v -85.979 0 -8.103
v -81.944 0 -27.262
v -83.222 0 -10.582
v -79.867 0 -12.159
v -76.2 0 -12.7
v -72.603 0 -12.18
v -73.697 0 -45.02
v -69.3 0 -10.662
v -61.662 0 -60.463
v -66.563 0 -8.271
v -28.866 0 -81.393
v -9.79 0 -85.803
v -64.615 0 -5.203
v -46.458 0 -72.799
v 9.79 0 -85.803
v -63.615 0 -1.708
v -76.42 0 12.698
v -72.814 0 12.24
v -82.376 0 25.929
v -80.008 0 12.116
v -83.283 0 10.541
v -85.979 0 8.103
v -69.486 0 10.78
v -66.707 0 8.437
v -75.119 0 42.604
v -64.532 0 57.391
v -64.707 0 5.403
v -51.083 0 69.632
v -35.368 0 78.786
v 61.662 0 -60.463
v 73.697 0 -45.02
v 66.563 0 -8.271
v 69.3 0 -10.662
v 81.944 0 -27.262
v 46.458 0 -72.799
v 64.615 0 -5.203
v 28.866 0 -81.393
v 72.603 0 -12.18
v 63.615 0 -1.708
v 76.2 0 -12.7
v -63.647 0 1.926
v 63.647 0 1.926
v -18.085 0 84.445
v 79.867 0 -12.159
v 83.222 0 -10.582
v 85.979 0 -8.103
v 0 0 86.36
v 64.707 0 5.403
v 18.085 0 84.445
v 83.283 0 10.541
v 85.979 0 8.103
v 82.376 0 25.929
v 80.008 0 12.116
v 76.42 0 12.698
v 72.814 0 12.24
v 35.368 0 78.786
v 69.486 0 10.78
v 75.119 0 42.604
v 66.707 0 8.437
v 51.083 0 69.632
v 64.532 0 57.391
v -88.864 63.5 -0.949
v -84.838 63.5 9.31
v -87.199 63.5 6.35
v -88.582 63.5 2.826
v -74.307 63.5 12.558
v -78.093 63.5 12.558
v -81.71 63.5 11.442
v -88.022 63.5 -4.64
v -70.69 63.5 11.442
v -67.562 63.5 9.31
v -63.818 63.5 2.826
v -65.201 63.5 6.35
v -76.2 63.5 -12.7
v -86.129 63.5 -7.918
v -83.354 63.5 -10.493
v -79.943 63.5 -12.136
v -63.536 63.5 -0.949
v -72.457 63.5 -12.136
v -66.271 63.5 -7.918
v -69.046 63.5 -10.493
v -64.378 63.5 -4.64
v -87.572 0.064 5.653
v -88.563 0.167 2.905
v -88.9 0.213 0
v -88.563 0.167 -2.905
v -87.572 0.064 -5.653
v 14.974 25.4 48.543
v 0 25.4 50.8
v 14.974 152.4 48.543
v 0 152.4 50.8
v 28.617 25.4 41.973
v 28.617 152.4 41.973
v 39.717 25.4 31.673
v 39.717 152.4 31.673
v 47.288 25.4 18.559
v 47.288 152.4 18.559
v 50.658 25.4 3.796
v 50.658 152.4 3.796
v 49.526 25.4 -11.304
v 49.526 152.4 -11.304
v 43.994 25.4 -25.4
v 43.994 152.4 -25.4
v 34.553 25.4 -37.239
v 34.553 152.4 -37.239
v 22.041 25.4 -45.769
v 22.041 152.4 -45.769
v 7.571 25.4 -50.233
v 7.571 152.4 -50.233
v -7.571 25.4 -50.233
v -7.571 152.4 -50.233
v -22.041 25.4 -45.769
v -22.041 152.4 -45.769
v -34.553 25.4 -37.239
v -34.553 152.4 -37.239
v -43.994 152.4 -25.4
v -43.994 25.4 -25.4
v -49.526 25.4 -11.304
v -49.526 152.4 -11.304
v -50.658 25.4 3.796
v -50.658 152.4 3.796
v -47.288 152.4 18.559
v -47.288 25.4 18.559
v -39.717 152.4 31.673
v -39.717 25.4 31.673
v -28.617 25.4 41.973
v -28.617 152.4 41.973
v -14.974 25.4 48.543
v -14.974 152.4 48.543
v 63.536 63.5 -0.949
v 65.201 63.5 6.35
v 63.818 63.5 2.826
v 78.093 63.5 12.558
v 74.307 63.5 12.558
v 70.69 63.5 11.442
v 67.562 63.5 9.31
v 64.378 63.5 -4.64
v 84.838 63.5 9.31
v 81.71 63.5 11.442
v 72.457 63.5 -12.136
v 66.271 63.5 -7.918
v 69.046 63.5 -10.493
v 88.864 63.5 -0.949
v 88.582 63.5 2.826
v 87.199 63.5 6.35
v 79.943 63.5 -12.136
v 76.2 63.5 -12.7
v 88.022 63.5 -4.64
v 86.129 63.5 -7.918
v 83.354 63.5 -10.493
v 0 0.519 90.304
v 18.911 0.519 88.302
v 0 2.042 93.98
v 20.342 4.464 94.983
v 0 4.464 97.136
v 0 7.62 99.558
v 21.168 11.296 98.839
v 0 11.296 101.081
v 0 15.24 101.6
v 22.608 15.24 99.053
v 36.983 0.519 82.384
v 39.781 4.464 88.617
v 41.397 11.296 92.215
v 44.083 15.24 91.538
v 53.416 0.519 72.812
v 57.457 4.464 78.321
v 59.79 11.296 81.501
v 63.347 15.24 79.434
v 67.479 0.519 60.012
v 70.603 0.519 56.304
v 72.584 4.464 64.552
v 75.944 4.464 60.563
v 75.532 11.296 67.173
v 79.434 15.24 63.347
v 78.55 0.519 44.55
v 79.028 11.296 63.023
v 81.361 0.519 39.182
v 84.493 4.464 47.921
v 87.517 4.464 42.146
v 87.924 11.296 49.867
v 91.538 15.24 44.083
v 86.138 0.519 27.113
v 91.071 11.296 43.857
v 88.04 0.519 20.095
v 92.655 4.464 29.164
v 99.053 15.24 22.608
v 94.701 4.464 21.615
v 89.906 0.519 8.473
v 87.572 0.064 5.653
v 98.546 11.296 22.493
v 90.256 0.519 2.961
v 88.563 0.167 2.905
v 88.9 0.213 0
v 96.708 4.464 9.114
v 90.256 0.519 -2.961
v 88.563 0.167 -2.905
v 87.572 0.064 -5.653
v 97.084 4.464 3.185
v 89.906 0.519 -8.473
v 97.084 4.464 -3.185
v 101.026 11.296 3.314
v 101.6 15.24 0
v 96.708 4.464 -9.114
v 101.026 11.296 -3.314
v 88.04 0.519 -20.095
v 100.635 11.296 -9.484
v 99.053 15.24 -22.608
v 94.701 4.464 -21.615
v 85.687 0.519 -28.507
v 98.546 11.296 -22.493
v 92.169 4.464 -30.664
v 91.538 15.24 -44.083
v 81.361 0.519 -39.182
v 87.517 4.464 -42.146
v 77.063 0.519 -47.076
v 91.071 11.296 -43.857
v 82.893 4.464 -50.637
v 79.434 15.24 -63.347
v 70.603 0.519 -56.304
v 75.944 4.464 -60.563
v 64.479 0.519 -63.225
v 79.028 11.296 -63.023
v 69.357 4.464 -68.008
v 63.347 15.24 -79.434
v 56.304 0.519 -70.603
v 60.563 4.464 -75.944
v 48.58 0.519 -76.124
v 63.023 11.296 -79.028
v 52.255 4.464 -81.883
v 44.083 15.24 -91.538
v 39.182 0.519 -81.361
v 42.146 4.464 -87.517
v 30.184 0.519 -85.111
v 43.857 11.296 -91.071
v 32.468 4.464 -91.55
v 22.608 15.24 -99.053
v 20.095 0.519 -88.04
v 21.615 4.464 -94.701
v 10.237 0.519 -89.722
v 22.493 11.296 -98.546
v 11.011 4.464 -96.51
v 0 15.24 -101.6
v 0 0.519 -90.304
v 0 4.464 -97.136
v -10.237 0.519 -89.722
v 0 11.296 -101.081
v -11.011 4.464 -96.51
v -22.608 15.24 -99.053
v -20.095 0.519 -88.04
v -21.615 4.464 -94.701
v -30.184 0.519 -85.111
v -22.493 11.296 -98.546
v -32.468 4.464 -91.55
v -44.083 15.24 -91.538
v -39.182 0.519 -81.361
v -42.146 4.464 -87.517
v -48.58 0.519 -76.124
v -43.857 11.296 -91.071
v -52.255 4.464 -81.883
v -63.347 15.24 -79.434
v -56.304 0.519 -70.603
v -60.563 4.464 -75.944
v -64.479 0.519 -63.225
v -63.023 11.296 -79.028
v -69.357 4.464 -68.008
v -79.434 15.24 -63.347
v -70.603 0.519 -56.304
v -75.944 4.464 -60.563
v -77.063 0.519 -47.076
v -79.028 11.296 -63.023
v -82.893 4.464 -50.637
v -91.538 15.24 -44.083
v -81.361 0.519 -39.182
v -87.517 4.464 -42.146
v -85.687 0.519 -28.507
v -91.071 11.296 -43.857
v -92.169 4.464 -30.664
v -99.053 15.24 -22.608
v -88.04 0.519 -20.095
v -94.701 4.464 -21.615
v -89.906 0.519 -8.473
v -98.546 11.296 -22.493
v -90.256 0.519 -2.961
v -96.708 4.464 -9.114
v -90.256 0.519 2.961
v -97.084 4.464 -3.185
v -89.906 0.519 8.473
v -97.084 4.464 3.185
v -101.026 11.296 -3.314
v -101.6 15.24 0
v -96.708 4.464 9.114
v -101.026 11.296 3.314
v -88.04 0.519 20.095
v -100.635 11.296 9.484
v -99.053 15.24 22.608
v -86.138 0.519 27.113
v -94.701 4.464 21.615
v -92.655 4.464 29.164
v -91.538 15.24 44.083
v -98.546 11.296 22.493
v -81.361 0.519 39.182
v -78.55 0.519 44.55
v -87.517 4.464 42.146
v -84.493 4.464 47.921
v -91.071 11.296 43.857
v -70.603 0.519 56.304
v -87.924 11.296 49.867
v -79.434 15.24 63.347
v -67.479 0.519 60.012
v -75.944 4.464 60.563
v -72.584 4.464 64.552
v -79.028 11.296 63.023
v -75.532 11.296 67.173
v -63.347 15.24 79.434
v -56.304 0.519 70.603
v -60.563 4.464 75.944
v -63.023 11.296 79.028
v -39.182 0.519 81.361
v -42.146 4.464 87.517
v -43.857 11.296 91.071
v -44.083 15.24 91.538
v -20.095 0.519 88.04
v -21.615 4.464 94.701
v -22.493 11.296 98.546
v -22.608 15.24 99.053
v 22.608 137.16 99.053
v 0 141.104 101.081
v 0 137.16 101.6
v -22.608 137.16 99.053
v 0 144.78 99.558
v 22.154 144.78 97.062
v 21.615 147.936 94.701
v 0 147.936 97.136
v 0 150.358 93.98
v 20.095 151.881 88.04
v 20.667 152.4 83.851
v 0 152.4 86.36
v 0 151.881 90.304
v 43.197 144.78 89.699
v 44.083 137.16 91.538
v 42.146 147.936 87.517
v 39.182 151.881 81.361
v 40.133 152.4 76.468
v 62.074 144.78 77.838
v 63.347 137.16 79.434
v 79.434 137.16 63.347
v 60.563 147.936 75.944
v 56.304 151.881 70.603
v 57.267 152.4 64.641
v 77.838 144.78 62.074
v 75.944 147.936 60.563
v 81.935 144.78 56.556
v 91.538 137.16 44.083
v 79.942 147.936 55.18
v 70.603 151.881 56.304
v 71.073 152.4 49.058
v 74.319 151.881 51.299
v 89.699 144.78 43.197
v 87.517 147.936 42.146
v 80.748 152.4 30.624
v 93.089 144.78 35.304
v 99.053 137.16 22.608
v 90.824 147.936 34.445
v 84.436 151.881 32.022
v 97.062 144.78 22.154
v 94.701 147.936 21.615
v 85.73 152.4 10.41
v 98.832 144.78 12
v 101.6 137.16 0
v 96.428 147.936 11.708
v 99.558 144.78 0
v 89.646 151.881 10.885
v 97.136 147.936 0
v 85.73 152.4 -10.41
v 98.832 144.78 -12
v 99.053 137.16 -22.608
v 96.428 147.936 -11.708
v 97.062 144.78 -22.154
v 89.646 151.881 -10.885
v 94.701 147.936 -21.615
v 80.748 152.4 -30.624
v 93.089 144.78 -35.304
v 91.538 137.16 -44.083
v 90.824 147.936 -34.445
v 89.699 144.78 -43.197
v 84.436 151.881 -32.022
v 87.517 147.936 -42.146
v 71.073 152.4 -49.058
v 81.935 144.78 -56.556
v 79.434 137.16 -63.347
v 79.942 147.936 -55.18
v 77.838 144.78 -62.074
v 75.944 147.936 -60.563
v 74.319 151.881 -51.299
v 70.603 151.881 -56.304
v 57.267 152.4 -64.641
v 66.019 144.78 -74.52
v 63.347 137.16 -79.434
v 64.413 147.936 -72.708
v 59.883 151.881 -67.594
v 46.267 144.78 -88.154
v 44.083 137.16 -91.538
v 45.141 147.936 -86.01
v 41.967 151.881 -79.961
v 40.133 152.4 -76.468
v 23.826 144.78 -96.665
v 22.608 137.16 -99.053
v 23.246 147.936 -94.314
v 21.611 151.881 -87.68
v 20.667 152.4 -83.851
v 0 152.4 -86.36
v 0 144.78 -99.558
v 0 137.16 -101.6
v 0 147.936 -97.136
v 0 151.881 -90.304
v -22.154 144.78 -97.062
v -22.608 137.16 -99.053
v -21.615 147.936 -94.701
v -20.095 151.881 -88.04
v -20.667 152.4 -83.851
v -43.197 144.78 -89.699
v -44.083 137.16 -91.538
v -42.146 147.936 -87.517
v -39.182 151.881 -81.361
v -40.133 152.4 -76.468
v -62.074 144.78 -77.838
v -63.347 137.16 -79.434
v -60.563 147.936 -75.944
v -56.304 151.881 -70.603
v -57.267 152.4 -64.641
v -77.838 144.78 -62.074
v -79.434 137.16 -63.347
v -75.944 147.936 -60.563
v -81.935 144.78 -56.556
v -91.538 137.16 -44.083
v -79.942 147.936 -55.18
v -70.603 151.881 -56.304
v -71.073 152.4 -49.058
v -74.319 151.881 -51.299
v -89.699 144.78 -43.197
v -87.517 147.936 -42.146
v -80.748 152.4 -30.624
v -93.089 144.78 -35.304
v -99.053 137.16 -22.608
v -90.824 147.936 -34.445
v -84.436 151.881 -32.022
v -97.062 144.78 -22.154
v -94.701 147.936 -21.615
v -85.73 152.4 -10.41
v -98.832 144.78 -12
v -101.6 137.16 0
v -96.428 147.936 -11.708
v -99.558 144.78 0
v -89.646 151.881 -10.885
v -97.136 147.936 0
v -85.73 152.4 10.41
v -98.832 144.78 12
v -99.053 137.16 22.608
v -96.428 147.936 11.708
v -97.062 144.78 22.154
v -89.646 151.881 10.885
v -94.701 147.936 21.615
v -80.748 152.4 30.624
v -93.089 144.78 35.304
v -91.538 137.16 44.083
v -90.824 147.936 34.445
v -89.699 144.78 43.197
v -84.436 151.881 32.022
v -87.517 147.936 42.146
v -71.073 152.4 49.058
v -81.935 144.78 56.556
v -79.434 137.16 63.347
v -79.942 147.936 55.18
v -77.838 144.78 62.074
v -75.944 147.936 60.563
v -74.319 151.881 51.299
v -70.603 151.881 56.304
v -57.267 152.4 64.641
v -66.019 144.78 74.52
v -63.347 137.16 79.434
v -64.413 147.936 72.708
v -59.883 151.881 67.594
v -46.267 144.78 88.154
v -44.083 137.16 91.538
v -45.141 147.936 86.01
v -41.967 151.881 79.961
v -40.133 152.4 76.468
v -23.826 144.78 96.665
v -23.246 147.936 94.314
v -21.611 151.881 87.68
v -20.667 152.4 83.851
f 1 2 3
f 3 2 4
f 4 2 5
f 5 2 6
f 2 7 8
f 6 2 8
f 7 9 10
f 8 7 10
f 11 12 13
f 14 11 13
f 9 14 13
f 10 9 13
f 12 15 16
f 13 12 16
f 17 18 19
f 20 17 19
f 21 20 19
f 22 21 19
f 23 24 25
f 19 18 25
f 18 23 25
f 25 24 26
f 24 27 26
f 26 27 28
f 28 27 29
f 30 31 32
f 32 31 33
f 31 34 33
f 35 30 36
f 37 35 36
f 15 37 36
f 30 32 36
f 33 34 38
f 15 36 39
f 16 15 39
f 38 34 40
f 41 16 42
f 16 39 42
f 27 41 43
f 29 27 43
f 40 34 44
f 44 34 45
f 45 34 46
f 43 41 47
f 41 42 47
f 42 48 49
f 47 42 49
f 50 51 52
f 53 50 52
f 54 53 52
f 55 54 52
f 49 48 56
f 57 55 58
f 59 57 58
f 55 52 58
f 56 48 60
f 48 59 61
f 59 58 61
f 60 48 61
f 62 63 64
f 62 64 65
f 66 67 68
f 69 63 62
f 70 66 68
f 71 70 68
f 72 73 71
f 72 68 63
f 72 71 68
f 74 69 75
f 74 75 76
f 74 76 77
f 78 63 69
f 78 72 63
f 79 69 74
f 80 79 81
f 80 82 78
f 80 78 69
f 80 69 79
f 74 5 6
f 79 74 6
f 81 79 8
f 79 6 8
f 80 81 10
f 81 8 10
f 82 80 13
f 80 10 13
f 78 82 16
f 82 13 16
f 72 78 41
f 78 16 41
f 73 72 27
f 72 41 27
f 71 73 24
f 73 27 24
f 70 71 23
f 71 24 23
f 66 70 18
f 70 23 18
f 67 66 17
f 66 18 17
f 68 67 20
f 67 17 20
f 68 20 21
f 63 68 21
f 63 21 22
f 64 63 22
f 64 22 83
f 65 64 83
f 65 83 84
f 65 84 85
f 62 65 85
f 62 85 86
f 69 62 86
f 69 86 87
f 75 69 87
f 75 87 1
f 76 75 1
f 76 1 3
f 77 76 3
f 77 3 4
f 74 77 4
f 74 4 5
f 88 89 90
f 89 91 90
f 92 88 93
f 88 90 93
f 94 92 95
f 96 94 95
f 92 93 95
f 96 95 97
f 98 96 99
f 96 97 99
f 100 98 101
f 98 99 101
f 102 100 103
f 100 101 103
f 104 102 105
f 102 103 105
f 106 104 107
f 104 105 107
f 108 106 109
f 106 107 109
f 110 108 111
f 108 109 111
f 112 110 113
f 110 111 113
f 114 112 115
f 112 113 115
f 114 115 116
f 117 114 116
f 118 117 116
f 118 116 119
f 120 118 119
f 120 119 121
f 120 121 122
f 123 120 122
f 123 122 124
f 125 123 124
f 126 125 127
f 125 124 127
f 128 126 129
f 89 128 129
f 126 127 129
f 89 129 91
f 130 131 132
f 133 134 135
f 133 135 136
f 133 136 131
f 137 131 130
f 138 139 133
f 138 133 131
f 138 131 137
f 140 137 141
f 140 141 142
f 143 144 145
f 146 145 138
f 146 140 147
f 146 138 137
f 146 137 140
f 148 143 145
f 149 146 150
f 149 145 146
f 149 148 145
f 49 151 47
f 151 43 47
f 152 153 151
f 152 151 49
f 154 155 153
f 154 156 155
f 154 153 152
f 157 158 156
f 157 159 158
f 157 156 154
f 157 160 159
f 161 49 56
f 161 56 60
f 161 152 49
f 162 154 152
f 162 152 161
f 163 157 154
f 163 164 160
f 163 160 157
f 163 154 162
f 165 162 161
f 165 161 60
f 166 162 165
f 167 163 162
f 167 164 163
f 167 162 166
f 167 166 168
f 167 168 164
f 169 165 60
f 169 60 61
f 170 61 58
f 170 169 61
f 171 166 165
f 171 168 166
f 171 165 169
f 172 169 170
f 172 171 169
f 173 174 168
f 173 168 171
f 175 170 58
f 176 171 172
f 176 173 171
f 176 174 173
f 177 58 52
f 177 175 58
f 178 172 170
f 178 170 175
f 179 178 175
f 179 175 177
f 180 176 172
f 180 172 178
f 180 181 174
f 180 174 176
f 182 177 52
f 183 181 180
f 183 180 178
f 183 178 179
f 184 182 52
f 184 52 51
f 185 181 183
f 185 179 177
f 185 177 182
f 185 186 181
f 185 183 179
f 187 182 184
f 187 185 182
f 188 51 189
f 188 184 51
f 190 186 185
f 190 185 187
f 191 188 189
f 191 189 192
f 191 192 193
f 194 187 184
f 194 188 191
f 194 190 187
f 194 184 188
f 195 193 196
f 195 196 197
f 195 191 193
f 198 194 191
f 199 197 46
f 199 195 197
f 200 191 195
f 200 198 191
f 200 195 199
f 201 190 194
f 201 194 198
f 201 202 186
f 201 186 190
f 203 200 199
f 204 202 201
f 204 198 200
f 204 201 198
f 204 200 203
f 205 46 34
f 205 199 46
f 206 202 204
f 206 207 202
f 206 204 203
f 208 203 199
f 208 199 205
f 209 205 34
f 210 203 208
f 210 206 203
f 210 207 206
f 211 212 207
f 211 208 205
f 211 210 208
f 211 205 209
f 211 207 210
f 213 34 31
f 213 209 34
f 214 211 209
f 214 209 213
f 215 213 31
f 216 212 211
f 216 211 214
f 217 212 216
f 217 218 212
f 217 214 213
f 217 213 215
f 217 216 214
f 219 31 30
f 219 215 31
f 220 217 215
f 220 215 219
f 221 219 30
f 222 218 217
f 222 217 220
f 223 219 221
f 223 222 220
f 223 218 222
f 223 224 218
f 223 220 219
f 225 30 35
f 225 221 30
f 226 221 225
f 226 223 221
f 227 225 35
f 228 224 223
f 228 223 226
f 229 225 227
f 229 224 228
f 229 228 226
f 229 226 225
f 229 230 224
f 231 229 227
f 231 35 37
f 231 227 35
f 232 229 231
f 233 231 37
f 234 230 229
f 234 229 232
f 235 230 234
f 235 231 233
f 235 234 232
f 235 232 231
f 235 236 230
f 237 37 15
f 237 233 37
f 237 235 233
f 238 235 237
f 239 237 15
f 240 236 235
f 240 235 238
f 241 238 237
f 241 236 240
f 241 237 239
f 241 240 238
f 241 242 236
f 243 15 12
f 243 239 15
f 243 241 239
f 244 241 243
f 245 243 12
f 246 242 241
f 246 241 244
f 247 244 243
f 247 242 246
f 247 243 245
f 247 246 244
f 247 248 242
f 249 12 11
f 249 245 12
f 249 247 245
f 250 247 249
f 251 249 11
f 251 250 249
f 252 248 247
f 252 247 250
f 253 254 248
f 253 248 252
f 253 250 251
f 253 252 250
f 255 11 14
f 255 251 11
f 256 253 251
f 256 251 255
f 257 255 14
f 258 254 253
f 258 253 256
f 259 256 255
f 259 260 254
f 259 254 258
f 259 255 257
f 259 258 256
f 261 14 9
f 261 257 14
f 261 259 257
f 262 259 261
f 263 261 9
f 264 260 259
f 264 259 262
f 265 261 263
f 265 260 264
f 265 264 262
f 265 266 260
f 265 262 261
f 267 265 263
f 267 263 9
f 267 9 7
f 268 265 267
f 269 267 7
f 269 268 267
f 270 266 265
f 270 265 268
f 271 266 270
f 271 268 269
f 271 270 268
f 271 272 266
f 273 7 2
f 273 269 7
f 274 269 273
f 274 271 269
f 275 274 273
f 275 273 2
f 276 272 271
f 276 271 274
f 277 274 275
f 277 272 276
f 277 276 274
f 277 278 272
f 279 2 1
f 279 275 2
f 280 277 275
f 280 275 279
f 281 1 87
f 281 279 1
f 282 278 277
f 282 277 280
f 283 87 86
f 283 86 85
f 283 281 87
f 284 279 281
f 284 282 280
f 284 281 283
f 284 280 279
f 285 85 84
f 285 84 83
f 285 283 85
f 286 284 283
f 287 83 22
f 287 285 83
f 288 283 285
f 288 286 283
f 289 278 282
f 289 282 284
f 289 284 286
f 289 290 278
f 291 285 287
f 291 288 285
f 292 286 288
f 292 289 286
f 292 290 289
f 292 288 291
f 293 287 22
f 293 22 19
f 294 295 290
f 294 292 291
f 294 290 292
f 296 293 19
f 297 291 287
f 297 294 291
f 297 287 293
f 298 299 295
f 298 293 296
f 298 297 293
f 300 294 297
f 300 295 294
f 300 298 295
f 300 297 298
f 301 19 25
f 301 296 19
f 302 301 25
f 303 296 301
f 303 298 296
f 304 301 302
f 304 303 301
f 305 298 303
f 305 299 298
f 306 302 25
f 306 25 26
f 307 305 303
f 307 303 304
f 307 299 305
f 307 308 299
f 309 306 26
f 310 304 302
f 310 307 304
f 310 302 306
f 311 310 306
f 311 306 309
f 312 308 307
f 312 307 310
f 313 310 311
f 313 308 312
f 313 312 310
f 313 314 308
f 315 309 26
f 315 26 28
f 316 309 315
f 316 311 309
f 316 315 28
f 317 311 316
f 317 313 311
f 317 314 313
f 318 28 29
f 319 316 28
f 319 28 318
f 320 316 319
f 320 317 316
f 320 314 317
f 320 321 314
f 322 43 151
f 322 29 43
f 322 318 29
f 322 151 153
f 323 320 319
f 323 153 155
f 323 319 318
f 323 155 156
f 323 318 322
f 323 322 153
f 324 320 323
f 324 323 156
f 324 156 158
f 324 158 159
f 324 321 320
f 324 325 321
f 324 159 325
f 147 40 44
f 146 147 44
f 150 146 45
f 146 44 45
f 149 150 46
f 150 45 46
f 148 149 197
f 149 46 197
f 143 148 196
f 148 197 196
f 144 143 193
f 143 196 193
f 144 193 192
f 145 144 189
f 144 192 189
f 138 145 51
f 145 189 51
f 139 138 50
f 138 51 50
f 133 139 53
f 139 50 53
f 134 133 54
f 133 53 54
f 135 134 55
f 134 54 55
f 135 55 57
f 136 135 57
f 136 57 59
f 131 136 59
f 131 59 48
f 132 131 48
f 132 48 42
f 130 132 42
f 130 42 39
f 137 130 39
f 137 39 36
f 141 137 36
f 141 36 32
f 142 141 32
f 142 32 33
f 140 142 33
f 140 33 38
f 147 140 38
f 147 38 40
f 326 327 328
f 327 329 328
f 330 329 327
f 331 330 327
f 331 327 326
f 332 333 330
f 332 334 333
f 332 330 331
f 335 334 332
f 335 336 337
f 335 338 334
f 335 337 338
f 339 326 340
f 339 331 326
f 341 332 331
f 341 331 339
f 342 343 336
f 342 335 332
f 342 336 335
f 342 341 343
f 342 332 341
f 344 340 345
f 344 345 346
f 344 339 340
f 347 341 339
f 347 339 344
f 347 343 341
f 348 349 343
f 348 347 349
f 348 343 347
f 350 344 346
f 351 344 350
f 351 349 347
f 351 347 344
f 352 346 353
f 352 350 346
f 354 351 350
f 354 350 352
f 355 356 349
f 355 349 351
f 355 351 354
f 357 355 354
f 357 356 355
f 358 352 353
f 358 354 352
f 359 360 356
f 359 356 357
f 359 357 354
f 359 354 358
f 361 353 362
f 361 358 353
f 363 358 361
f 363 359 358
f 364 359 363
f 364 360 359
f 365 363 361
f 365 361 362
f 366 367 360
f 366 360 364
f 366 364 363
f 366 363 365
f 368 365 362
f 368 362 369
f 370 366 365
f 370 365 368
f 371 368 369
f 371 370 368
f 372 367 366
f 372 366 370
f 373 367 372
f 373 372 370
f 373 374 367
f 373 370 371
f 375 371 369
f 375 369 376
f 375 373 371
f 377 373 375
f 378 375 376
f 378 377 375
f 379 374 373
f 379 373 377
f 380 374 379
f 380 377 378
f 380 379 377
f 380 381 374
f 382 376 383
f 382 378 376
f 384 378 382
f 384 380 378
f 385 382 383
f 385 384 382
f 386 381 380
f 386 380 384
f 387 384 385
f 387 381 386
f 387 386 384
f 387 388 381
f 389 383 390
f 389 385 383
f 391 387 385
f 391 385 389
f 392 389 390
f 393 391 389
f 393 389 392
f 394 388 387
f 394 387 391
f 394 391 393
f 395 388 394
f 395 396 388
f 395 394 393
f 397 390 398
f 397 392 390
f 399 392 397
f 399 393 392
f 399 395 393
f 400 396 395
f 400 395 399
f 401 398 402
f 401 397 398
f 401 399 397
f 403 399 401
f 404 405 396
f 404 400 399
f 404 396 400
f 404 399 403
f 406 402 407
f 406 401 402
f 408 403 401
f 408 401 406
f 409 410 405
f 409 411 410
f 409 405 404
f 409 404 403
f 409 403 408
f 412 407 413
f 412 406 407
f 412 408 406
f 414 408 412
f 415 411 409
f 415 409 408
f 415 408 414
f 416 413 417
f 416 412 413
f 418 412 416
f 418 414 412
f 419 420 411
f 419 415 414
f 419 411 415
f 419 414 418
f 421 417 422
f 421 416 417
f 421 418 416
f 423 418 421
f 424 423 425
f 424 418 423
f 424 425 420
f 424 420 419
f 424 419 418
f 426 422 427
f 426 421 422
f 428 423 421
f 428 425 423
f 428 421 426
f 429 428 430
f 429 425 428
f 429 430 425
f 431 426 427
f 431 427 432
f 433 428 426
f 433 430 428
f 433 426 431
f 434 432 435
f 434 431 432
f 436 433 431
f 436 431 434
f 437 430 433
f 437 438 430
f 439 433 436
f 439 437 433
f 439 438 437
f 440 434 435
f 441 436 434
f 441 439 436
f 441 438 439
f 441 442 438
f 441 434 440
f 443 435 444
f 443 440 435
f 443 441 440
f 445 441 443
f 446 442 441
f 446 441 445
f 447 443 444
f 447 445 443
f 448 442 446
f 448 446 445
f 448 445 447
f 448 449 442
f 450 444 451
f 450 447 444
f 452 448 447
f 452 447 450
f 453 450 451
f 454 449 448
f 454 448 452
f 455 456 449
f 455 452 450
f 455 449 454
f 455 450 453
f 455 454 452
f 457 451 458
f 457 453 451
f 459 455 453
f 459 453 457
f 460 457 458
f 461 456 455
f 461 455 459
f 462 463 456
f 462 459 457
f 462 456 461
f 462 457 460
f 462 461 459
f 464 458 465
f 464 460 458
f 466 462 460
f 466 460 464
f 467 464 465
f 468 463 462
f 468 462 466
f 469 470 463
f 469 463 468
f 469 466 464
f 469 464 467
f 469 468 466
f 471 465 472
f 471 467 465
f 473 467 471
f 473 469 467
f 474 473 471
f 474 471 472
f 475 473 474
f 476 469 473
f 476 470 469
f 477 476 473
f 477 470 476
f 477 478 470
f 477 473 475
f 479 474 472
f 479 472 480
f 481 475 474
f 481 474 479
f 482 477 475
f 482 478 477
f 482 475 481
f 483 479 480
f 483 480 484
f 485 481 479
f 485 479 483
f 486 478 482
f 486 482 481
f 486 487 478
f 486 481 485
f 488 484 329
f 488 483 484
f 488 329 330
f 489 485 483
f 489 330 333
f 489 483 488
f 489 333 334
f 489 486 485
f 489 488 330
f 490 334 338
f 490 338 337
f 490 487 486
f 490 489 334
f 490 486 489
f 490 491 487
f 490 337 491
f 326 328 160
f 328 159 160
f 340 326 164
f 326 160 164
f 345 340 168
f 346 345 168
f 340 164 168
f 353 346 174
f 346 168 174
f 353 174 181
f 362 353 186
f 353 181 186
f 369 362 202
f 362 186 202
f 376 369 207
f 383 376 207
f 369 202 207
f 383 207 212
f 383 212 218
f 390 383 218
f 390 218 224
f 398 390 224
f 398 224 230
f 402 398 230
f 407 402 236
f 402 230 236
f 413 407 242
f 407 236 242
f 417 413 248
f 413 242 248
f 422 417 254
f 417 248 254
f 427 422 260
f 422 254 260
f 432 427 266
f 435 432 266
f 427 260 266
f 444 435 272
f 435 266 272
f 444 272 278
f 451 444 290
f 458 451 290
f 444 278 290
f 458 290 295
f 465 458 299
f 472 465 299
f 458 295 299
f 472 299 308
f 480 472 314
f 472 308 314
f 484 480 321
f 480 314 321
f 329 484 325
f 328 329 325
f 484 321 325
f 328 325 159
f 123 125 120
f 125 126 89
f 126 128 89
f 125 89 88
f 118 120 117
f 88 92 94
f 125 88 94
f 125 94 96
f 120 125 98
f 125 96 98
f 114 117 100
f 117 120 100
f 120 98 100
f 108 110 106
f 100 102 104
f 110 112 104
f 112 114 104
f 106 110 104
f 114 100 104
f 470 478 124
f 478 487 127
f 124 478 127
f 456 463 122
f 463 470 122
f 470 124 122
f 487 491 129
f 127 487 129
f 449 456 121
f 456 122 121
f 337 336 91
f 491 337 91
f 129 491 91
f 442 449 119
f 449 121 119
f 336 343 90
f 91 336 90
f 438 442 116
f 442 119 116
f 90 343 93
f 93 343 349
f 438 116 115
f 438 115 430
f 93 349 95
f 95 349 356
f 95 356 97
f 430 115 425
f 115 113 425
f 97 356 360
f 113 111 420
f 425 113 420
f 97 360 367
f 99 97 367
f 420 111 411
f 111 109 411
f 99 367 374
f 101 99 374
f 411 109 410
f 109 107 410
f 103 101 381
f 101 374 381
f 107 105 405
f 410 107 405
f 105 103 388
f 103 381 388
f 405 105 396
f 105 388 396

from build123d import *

# Parameters (mm, degrees)
CUT_EXTRUDE1_START = 12.7
SKETCH2_R          = 12.7
CUT_EXTRUDE1_DEPTH = 76.2
FILLET2_R          = 15.24


with BuildPart() as part:
    # Sketch1 → Revolve1 (revolve)
    with BuildSketch(Plane.XY, mode=Mode.PRIVATE) as revolve1_sk:
        Polygon((0, 0), (0, 25.4), (50.8, 25.4), (50.8, 152.4), (101.6, 152.4), (101.6, 0), align=None)
    revolve(revolve1_sk.sketch.rotate(Axis((0, 0, 0), (0, 1, 0)), 270), axis=Axis((0, 0, 0), (0, 1, 0)))

    # Sketch2 → Cut-Extrude1 (cut)
    with BuildSketch(Plane.XZ.offset(CUT_EXTRUDE1_START)):
        with Locations(Location((-76.2, 0, 0), (0, 0, 270))):
            Circle(SKETCH2_R)
        with Locations(Location((76.2, 0, 0), (0, 0, 270))):
            Circle(SKETCH2_R)
    extrude(amount=-CUT_EXTRUDE1_DEPTH, mode=Mode.SUBTRACT)

    # Fillet2
    # the kernel refuses this fillet: 15.24 mm, written as the material it takes off along each edge
    with BuildSketch(Plane(origin=(0, 0, 0), x_dir=(0, 0, 1), z_dir=(-1, 0, 0))) as fillet2_piece_1:
        with BuildLine():
            CenterArc((101.6 - FILLET2_R, FILLET2_R), FILLET2_R, 270, 90)
            Line((101.6 - FILLET2_R, 0), (101.6, 0))
            Line((101.6, 0), (101.6, FILLET2_R))
        make_face()
    revolve(axis=Axis((0, 0, 0), (0, 1, 0)), mode=Mode.SUBTRACT)
    with BuildSketch(Plane(origin=(0, 152.4, 0), x_dir=(0, 0, 1), z_dir=(-1, 0, 0))) as fillet2_piece_2:
        with BuildLine():
            CenterArc((101.6 - FILLET2_R, -FILLET2_R), FILLET2_R, 0, 90)
            Line((101.6, -FILLET2_R), (101.6, 0))
            Line((101.6, 0), (101.6 - FILLET2_R, 0))
        make_face()
    revolve(axis=Axis((0, 152.4, 0), (0, 1, 0)), mode=Mode.SUBTRACT)


solid = part.part
